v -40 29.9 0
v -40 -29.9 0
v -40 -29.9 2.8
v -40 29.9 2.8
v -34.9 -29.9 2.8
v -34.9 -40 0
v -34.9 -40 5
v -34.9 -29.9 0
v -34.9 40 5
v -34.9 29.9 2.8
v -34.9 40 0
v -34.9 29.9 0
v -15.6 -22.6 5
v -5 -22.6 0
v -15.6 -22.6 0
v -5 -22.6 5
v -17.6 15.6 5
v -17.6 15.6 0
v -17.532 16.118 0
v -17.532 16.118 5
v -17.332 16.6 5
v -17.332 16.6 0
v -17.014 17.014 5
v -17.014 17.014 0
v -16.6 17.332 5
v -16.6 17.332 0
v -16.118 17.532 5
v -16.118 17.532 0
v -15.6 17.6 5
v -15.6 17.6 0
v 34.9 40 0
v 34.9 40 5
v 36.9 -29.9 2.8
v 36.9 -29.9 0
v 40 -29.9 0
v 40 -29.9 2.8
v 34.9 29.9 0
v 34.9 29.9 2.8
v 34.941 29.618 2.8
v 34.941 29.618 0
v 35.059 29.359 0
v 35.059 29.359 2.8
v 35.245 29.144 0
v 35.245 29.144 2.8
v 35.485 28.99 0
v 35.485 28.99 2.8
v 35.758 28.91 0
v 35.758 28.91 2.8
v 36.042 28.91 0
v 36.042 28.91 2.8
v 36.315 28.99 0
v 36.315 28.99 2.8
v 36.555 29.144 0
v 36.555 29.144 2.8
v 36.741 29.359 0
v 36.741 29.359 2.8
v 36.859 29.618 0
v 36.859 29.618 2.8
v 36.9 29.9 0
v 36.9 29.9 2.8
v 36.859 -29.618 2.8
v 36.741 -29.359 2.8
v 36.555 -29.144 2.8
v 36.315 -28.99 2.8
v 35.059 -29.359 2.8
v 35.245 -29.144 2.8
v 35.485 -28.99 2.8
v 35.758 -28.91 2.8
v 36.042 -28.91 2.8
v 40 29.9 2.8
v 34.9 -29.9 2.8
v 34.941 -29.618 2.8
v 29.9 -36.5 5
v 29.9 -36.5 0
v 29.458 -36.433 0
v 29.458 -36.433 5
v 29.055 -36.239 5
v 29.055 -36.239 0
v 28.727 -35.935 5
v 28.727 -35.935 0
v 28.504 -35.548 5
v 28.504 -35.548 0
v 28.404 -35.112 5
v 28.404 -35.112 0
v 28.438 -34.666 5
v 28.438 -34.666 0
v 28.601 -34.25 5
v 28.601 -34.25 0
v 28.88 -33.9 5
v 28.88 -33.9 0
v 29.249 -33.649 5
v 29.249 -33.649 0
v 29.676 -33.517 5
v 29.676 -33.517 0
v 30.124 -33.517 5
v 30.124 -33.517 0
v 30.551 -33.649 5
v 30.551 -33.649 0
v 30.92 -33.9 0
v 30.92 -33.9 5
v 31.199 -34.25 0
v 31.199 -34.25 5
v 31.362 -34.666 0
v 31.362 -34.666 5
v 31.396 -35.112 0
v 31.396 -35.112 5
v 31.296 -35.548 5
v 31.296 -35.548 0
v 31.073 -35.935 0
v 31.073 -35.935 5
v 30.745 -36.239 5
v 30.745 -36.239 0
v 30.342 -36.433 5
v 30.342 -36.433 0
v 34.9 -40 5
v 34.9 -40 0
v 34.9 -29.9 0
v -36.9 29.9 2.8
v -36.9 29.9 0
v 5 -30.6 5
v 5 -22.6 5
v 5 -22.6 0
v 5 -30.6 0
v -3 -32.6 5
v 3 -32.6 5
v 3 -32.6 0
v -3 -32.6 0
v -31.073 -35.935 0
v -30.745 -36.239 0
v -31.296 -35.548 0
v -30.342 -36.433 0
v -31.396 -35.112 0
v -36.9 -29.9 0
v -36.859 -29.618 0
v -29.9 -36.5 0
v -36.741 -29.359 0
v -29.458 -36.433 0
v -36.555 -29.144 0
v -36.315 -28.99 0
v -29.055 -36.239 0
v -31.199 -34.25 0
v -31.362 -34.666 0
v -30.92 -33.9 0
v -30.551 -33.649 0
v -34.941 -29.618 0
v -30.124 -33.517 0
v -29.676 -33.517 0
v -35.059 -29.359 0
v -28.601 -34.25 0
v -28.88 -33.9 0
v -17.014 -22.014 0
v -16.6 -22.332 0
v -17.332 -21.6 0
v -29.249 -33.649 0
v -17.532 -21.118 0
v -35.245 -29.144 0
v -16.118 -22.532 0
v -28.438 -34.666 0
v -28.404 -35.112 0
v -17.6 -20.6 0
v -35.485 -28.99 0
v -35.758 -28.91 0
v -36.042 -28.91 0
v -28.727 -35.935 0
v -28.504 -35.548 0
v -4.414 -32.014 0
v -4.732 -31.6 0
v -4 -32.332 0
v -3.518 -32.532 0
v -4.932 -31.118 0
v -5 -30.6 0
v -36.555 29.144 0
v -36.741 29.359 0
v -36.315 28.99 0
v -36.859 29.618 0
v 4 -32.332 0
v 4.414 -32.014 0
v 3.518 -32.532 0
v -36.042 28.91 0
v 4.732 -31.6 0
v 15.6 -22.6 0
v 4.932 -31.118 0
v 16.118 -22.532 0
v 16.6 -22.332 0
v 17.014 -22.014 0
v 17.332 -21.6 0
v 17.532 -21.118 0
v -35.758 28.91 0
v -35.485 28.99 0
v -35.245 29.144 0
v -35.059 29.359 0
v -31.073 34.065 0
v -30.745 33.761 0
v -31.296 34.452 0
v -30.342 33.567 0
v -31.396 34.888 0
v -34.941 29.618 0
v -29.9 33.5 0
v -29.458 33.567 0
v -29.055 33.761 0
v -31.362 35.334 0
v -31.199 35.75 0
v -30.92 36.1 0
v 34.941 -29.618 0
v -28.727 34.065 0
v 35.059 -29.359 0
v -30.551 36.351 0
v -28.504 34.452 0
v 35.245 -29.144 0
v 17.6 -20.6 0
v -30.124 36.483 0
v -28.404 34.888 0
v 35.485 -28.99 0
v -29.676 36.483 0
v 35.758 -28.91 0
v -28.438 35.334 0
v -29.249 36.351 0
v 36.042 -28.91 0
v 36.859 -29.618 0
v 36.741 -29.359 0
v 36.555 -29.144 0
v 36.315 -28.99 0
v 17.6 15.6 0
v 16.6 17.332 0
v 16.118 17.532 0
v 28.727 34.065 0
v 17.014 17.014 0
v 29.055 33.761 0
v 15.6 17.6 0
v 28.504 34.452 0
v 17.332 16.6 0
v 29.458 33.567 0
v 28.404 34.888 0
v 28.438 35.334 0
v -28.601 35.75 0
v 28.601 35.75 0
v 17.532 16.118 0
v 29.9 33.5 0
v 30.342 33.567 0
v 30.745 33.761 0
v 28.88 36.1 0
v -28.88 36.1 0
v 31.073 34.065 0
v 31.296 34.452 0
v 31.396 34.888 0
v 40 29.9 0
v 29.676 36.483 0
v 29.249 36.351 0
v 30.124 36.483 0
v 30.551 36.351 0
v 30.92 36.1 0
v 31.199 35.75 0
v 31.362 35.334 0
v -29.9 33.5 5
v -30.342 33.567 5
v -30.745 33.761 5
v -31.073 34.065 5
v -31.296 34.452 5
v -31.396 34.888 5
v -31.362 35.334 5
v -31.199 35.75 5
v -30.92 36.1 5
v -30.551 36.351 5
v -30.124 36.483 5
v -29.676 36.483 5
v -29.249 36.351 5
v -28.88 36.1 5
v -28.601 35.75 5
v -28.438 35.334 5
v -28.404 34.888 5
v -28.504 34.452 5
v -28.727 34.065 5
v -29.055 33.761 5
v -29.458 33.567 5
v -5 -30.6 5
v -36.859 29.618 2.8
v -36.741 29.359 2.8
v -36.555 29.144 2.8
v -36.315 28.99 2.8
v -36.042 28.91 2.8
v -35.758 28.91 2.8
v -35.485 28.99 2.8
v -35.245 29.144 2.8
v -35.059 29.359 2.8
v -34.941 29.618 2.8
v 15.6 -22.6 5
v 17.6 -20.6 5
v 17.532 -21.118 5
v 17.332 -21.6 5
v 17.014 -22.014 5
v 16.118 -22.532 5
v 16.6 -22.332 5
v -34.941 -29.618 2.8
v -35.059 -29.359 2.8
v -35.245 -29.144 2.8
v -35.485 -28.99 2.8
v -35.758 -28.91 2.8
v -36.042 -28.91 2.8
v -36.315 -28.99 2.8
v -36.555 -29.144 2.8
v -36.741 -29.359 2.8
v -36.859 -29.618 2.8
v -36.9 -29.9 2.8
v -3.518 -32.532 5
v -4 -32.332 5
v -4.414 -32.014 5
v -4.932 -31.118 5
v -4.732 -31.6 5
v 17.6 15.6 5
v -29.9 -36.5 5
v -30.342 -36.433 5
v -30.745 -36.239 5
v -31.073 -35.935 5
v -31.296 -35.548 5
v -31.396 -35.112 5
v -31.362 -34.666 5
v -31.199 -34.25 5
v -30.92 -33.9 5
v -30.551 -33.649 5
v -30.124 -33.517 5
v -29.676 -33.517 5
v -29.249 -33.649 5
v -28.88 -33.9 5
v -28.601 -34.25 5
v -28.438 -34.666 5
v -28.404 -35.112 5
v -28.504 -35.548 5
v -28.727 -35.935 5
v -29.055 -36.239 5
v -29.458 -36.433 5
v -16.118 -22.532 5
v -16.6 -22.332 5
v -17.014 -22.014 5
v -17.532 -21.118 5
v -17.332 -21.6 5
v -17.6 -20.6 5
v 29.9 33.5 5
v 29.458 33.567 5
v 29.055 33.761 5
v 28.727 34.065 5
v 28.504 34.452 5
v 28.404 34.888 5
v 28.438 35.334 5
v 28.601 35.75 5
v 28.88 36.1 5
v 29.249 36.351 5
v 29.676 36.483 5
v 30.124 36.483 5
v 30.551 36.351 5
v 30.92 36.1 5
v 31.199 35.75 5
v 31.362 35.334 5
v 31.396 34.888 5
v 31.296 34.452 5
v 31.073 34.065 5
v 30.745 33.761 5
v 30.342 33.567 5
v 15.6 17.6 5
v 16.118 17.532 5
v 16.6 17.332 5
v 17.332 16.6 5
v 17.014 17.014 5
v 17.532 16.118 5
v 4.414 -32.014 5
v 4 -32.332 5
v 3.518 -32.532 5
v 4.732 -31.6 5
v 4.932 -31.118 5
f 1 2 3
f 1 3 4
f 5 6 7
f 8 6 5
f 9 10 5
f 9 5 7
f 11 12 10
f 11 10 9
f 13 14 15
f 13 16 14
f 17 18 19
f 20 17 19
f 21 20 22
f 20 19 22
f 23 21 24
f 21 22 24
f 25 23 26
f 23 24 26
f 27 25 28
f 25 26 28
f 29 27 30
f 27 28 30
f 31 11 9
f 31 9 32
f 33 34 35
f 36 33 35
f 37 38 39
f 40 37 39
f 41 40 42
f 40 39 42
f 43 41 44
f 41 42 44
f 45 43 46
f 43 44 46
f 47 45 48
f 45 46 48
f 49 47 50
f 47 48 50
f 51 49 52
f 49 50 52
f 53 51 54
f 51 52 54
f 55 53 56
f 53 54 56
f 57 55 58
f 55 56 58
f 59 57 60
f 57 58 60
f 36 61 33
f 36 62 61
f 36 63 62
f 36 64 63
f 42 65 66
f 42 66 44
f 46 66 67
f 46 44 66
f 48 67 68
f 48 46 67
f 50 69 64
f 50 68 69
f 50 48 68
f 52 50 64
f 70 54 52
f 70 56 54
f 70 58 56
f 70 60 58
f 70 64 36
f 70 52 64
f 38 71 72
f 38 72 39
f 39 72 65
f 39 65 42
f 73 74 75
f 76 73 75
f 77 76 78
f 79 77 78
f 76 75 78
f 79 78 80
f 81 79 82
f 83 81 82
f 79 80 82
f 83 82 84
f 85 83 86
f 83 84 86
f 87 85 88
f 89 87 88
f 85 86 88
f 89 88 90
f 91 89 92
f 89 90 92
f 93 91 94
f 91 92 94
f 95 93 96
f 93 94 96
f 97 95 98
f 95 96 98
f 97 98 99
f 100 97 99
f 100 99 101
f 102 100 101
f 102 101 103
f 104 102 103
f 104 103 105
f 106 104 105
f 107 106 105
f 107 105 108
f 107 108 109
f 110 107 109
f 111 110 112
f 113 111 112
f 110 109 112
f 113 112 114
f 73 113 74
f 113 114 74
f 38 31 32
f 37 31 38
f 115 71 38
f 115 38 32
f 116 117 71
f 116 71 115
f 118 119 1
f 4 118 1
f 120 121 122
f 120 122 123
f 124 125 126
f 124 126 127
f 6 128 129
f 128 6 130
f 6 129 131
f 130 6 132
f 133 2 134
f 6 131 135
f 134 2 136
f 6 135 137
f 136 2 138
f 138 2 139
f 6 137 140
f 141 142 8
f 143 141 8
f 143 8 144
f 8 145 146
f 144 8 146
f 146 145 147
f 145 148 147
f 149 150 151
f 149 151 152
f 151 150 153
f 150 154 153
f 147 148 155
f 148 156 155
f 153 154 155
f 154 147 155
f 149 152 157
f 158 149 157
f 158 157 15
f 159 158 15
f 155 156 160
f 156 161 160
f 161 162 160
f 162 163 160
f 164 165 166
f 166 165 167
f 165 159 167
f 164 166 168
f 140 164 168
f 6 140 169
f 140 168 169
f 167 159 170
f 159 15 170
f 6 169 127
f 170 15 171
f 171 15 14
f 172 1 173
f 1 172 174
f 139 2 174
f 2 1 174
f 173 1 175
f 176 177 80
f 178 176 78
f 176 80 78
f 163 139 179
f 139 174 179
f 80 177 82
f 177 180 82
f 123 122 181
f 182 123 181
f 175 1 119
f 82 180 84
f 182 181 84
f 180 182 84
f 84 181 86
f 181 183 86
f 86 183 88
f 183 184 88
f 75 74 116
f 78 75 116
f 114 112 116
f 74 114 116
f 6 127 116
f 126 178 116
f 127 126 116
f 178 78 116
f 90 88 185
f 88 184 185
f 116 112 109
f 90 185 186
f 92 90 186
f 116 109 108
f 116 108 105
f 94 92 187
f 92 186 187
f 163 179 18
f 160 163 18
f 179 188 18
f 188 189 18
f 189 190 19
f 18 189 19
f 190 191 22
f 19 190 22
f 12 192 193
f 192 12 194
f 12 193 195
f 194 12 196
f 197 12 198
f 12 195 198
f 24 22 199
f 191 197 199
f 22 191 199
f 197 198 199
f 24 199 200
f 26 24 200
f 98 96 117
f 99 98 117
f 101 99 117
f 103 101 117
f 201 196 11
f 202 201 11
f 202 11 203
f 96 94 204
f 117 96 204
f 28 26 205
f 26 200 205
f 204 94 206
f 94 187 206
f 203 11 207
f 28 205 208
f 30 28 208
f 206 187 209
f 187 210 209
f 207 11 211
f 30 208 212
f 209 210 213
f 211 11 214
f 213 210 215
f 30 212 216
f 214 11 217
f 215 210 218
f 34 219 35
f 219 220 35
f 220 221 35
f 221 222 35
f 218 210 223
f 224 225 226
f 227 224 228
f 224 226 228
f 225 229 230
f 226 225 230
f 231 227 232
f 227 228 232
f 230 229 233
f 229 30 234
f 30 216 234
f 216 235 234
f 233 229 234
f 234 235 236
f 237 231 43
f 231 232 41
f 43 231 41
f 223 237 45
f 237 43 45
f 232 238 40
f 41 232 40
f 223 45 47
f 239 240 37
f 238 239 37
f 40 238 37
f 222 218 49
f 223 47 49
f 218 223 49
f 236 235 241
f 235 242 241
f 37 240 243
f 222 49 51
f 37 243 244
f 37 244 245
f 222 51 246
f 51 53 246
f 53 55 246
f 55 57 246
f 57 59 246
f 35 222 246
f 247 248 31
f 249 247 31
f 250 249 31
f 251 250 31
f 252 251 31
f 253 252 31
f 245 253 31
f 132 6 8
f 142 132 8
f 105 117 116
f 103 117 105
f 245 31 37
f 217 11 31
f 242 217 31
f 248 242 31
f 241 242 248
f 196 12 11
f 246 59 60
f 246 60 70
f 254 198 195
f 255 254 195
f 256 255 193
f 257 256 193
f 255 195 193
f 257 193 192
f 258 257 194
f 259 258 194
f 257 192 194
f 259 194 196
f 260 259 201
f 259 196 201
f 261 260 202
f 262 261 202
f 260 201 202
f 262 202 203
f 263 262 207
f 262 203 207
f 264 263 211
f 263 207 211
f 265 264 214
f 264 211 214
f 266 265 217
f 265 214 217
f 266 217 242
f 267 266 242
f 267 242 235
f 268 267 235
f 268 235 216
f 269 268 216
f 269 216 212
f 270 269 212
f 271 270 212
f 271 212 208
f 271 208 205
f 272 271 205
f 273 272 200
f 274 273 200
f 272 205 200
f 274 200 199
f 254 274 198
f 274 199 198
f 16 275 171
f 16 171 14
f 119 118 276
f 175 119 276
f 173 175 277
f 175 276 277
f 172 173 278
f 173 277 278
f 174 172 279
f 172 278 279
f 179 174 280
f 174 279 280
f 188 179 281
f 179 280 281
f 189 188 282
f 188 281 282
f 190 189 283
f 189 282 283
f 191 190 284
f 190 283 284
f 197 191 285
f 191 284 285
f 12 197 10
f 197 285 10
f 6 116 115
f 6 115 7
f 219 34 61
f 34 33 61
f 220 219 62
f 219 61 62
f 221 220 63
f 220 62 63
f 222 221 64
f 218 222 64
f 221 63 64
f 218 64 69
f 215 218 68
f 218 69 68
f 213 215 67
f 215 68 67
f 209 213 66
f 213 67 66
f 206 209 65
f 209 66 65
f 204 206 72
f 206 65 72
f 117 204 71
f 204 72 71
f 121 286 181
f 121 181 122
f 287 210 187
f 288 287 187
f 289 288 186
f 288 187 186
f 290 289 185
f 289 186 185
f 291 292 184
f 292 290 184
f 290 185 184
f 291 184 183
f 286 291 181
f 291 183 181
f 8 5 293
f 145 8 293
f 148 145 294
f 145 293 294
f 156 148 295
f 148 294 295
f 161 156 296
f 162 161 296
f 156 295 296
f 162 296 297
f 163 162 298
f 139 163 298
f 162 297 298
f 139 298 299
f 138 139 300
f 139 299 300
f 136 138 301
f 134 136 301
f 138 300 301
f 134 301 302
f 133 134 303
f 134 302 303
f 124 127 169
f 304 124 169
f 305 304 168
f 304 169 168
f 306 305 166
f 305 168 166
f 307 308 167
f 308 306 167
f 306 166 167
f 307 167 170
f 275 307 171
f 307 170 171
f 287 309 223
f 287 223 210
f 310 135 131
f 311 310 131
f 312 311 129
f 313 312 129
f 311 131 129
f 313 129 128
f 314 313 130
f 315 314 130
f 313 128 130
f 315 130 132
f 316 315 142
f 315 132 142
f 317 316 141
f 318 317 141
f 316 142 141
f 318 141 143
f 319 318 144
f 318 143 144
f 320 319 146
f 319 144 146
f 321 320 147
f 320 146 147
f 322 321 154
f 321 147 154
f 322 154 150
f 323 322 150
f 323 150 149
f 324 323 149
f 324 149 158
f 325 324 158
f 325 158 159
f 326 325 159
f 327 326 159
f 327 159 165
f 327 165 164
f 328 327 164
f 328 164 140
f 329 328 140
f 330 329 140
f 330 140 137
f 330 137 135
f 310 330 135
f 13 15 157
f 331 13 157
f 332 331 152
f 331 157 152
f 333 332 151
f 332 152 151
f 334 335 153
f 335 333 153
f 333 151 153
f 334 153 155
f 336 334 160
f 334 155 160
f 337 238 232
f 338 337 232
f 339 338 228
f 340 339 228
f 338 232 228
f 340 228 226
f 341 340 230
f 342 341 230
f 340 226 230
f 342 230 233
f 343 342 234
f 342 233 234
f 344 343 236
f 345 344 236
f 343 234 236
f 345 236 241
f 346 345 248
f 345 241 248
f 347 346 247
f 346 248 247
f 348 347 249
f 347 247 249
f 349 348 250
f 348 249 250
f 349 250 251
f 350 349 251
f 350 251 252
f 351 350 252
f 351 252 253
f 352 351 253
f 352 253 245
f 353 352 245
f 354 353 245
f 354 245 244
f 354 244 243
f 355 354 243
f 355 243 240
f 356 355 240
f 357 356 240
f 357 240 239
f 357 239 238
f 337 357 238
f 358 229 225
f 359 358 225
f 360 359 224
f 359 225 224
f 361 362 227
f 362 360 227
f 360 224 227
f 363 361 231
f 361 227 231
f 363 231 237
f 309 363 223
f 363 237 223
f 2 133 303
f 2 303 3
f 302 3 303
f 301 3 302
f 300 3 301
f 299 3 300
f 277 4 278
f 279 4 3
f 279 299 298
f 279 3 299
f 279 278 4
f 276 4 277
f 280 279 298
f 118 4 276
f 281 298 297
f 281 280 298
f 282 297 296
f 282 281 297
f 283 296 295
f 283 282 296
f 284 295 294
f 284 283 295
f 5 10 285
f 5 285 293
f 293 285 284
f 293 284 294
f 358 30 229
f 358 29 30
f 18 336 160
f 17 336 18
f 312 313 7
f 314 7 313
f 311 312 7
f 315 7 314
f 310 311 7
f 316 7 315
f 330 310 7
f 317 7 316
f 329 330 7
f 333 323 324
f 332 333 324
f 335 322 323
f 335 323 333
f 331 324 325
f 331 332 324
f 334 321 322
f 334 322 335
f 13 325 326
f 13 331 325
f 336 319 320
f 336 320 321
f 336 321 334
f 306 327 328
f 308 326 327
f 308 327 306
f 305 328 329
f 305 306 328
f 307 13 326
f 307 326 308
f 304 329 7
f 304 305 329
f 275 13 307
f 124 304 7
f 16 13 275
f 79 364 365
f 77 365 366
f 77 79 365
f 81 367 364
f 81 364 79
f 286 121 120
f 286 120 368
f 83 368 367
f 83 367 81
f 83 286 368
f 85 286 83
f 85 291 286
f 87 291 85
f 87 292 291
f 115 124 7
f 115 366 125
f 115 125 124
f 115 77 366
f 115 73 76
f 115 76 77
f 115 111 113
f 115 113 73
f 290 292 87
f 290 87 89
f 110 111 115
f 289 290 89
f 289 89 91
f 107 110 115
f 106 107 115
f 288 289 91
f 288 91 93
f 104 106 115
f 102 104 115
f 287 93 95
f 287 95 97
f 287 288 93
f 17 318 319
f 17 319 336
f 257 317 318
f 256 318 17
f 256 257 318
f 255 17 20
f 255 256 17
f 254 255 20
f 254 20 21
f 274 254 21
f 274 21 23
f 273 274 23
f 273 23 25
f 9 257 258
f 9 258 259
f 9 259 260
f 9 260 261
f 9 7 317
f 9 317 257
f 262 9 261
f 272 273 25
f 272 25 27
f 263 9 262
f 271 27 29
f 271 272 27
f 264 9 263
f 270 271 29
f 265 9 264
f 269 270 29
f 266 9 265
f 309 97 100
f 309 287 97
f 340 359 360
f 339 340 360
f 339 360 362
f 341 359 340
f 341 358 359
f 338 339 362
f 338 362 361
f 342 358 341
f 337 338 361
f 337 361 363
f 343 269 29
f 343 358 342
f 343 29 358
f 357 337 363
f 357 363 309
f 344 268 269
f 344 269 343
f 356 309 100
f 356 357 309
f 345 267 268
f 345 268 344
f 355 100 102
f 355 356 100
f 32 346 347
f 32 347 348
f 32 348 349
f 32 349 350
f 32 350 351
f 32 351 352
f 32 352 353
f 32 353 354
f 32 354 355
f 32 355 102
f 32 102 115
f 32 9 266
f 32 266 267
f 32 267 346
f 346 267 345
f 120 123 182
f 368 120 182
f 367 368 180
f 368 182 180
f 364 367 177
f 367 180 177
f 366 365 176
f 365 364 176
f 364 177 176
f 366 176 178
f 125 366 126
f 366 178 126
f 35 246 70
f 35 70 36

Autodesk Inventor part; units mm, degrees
ref_plane "YZ Plane" through (0, 0, 0) normal (1, 0, 0) x (0, 1, 0)
ref_plane "XZ Plane" through (0, 0, 0) normal (0, 1, 0) x (-1, 0, 0)
ref_plane "XY Plane" through (0, 0, 0) normal (0, 0, 1) x (1, 0, 0)
sketch "スケッチ1" plane through (0, 0, 0) normal (0, 0, 1) x (1, 0, 0)
  circle A0 centre (0, 0) radius 27.6
  line L0 (-40, 40) -> (40, 40)
  line L1 (40, 40) -> (40, -40)
  line L2 (40, -40) -> (-40, -40)
  line L3 (-40, -40) -> (-40, 40)
  dimension "d0" = 55.2
  dimension "d1" = 40
  dimension "d2" = 80
  dimension "d3" = 80
  dimension "d4" = 40
extrude "押し出し1" add sketch "スケッチ1" along normal blind 5 contours A0 | L0 L1 L2 L3
sketch "スケッチ3" plane through (0, 0, 5) normal (0, 0, 1) x (1, 0, 0)
  line L0 (40, -40) -> (-40, -40) projected
  line L1 (-40, 40) -> (-34.9, 40)
  line L2 (-34.9, 40) -> (-34.9, -40)
  line L3 (-34.9, -40) -> (-40, -40)
  line L4 (-40, -40) -> (-40, 40)
  line L5 (40, 40) -> (34.9, 40)
  line L6 (34.9, 40) -> (34.9, -40)
  line L7 (34.9, -40) -> (40, -40)
  line L8 (40, -40) -> (40, 40)
  dimension "d17" = 5.1
  dimension "d18" = 5.1
extrude "押し出し3" cut sketch "スケッチ3" against normal blind 2.2
sketch "スケッチ4" plane through (0, 0, 0) normal (0, 0, -1) x (-1, 0, 0)
  line L0 (-40, 40) -> (-34.9, 40)
  line L1 (-34.9, 40) -> (-34.9, 29.9)
  line L2 (-34.9, 29.9) -> (-40, 29.9)
  line L3 (-40, 29.9) -> (-40, 40)
  line L4 (-40, -40) -> (-34.9, -40)
  line L5 (-34.9, -40) -> (-34.9, -29.9)
  line L6 (-34.9, -29.9) -> (-40, -29.9)
  line L7 (-40, -29.9) -> (-40, -40)
  line L8 (40, 40) -> (34.9, 40)
  line L9 (34.9, 40) -> (34.9, 29.9)
  line L10 (34.9, 29.9) -> (40, 29.9)
  line L11 (40, 29.9) -> (40, 40)
  line L12 (40, -40) -> (34.9, -40)
  line L13 (34.9, -40) -> (34.9, -29.9)
  line L14 (34.9, -29.9) -> (40, -29.9)
  line L15 (40, -29.9) -> (40, -40)
  dimension "d21" = 5.1
  dimension "d22" = 10.1
  dimension "d23" = 10.1
  dimension "d24" = 10.1
  dimension "d25" = 5.1
  dimension "d26" = 5.1
  dimension "d27" = 5.1
  dimension "d28" = 10.1
extrude "押し出し4" cut sketch "スケッチ4" against normal through all
sketch "スケッチ5" plane through (0, 0, 0) normal (0, 0, -1) x (-1, 0, 0)
  line L0 (-40, -29.9) -> (-34.9, -29.9) projected
  line L1 (-34.9, -29.9) -> (-34.9, -40) projected
  line L2 (34.9, -40) -> (34.9, -29.9) projected
  line L3 (34.9, -29.9) -> (40, -29.9) projected
  line L4 (40, 29.9) -> (34.9, 29.9) projected
  line L5 (34.9, 29.9) -> (34.9, 40) projected
  line L6 (-34.9, 40) -> (-34.9, 29.9) projected
  line L7 (-34.9, 29.9) -> (-40, 29.9) projected
  point P0 (-35.9, 29.9)
  point P1 (-35.9, -29.9)
  point P2 (35.9, -29.9)
  point P3 (35.9, 29.9)
  dimension "d31" = 1
  dimension "d32" = 1
  dimension "d33" = 1
  dimension "d34" = 1
hole "Hole1" at (35.9, 29.9, 0) at (35.9, -29.9, 0) at (-35.9, -29.9, 0) at (-35.9, 29.9, 0) direction (0, 0, 1) diameter 2 end through all
sketch "スケッチ6" plane through (0, 0, 5) normal (0, 0, 1) x (1, 0, 0)
  line L0 (-17.6, 17.6) -> (17.6, 17.6)
  line L1 (17.6, 17.6) -> (17.6, -17.6)
  line L2 (17.6, -17.6) -> (-17.6, -17.6)
  line L3 (-17.6, -17.6) -> (-17.6, 17.6)
  line L4 (-17.6, -17.6) -> (17.6, -17.6)
  line L5 (17.6, -17.6) -> (17.6, -22.6)
  line L6 (17.6, -22.6) -> (-17.6, -22.6)
  line L7 (-17.6, -22.6) -> (-17.6, -17.6)
  point P0 (0, 0)
  dimension "d42" = 35.2
  dimension "d43" = 35.2
  dimension "d44" = 17.6
  dimension "d45" = 17.6
  dimension "d46" = 5
extrude "押し出し5" cut sketch "スケッチ6" against normal through all
fillet "フィレット1" radius 2 4 edges at (-17.6, 17.6, 2.5) (-17.6, -22.6, 2.5) (17.6, -22.6, 2.5) (17.6, 17.6, 2.5)
sketch "スケッチ7" plane through (0, 0, 5) normal (0, 0, 1) x (1, 0, 0)
  line L0 (-34.9, 40) -> (-34.9, -40) projected
  line L1 (34.9, -40) -> (-34.9, -40) projected
  line L2 (34.9, -40) -> (34.9, 40) projected
  line L3 (-34.9, 40) -> (34.9, 40) projected
  point P0 (0, 0)
  point P1 (-29.9, 35)
  point P2 (-29.9, -35)
  point P3 (29.9, -35)
  point P4 (29.9, 35)
  dimension "d50" = 5
  dimension "d51" = 5
  dimension "d52" = 5
  dimension "d53" = 5
  dimension "d54" = 5
  dimension "d55" = 5
  dimension "d56" = 5
  dimension "d57" = 5
hole "Hole2" at (-29.9, 35, 5) at (-29.9, -35, 5) at (29.9, -35, 5) at (29.9, 35, 5) direction (0, 0, -1) diameter 3 end through all
sketch "スケッチ8" plane through (0, 0, 5) normal (0, 0, 1) x (1, 0, 0)
  line L0 (15.6, -22.6) -> (-15.6, -22.6) projected
  line L1 (-5, -22.6) -> (5, -22.6)
  line L2 (5, -22.6) -> (5, -32.6)
  line L3 (5, -32.6) -> (-5, -32.6)
  line L4 (-5, -32.6) -> (-5, -22.6)
  point P0 (0, 0)
  dimension "d65" = 10
  dimension "d66" = 5
  dimension "d67" = 10
extrude "押し出し6" cut sketch "スケッチ8" against normal through all
fillet "フィレット2" radius 2 2 edges at (-5, -32.6, 2.5) (5, -32.6, 2.5)
equation "\"d1\" = 0.5 * d2"
equation "\"d3\" = d2"
equation "\"d4\" = d1"
equation "\"d18\" = d17"
equation "\"d23\" = d22"
equation "\"d25\" = d21"
equation "\"d26\" = d21"
equation "\"d27\" = d21"
equation "\"d28\" = d22"
equation "\"d32\" = d31"
equation "\"d33\" = d31"
equation "\"d34\" = d31"
equation "\"d44\" = 0.5 * d42"
equation "\"d45\" = d44"
equation "\"d51\" = d50"
equation "\"d52\" = d50"
equation "\"d53\" = d50"
equation "\"d54\" = d50"
equation "\"d55\" = d50"
equation "\"d56\" = d50"
equation "\"d57\" = d50"
equation "\"d66\" = 0.5 * d65"
properties part number "JointA1"
